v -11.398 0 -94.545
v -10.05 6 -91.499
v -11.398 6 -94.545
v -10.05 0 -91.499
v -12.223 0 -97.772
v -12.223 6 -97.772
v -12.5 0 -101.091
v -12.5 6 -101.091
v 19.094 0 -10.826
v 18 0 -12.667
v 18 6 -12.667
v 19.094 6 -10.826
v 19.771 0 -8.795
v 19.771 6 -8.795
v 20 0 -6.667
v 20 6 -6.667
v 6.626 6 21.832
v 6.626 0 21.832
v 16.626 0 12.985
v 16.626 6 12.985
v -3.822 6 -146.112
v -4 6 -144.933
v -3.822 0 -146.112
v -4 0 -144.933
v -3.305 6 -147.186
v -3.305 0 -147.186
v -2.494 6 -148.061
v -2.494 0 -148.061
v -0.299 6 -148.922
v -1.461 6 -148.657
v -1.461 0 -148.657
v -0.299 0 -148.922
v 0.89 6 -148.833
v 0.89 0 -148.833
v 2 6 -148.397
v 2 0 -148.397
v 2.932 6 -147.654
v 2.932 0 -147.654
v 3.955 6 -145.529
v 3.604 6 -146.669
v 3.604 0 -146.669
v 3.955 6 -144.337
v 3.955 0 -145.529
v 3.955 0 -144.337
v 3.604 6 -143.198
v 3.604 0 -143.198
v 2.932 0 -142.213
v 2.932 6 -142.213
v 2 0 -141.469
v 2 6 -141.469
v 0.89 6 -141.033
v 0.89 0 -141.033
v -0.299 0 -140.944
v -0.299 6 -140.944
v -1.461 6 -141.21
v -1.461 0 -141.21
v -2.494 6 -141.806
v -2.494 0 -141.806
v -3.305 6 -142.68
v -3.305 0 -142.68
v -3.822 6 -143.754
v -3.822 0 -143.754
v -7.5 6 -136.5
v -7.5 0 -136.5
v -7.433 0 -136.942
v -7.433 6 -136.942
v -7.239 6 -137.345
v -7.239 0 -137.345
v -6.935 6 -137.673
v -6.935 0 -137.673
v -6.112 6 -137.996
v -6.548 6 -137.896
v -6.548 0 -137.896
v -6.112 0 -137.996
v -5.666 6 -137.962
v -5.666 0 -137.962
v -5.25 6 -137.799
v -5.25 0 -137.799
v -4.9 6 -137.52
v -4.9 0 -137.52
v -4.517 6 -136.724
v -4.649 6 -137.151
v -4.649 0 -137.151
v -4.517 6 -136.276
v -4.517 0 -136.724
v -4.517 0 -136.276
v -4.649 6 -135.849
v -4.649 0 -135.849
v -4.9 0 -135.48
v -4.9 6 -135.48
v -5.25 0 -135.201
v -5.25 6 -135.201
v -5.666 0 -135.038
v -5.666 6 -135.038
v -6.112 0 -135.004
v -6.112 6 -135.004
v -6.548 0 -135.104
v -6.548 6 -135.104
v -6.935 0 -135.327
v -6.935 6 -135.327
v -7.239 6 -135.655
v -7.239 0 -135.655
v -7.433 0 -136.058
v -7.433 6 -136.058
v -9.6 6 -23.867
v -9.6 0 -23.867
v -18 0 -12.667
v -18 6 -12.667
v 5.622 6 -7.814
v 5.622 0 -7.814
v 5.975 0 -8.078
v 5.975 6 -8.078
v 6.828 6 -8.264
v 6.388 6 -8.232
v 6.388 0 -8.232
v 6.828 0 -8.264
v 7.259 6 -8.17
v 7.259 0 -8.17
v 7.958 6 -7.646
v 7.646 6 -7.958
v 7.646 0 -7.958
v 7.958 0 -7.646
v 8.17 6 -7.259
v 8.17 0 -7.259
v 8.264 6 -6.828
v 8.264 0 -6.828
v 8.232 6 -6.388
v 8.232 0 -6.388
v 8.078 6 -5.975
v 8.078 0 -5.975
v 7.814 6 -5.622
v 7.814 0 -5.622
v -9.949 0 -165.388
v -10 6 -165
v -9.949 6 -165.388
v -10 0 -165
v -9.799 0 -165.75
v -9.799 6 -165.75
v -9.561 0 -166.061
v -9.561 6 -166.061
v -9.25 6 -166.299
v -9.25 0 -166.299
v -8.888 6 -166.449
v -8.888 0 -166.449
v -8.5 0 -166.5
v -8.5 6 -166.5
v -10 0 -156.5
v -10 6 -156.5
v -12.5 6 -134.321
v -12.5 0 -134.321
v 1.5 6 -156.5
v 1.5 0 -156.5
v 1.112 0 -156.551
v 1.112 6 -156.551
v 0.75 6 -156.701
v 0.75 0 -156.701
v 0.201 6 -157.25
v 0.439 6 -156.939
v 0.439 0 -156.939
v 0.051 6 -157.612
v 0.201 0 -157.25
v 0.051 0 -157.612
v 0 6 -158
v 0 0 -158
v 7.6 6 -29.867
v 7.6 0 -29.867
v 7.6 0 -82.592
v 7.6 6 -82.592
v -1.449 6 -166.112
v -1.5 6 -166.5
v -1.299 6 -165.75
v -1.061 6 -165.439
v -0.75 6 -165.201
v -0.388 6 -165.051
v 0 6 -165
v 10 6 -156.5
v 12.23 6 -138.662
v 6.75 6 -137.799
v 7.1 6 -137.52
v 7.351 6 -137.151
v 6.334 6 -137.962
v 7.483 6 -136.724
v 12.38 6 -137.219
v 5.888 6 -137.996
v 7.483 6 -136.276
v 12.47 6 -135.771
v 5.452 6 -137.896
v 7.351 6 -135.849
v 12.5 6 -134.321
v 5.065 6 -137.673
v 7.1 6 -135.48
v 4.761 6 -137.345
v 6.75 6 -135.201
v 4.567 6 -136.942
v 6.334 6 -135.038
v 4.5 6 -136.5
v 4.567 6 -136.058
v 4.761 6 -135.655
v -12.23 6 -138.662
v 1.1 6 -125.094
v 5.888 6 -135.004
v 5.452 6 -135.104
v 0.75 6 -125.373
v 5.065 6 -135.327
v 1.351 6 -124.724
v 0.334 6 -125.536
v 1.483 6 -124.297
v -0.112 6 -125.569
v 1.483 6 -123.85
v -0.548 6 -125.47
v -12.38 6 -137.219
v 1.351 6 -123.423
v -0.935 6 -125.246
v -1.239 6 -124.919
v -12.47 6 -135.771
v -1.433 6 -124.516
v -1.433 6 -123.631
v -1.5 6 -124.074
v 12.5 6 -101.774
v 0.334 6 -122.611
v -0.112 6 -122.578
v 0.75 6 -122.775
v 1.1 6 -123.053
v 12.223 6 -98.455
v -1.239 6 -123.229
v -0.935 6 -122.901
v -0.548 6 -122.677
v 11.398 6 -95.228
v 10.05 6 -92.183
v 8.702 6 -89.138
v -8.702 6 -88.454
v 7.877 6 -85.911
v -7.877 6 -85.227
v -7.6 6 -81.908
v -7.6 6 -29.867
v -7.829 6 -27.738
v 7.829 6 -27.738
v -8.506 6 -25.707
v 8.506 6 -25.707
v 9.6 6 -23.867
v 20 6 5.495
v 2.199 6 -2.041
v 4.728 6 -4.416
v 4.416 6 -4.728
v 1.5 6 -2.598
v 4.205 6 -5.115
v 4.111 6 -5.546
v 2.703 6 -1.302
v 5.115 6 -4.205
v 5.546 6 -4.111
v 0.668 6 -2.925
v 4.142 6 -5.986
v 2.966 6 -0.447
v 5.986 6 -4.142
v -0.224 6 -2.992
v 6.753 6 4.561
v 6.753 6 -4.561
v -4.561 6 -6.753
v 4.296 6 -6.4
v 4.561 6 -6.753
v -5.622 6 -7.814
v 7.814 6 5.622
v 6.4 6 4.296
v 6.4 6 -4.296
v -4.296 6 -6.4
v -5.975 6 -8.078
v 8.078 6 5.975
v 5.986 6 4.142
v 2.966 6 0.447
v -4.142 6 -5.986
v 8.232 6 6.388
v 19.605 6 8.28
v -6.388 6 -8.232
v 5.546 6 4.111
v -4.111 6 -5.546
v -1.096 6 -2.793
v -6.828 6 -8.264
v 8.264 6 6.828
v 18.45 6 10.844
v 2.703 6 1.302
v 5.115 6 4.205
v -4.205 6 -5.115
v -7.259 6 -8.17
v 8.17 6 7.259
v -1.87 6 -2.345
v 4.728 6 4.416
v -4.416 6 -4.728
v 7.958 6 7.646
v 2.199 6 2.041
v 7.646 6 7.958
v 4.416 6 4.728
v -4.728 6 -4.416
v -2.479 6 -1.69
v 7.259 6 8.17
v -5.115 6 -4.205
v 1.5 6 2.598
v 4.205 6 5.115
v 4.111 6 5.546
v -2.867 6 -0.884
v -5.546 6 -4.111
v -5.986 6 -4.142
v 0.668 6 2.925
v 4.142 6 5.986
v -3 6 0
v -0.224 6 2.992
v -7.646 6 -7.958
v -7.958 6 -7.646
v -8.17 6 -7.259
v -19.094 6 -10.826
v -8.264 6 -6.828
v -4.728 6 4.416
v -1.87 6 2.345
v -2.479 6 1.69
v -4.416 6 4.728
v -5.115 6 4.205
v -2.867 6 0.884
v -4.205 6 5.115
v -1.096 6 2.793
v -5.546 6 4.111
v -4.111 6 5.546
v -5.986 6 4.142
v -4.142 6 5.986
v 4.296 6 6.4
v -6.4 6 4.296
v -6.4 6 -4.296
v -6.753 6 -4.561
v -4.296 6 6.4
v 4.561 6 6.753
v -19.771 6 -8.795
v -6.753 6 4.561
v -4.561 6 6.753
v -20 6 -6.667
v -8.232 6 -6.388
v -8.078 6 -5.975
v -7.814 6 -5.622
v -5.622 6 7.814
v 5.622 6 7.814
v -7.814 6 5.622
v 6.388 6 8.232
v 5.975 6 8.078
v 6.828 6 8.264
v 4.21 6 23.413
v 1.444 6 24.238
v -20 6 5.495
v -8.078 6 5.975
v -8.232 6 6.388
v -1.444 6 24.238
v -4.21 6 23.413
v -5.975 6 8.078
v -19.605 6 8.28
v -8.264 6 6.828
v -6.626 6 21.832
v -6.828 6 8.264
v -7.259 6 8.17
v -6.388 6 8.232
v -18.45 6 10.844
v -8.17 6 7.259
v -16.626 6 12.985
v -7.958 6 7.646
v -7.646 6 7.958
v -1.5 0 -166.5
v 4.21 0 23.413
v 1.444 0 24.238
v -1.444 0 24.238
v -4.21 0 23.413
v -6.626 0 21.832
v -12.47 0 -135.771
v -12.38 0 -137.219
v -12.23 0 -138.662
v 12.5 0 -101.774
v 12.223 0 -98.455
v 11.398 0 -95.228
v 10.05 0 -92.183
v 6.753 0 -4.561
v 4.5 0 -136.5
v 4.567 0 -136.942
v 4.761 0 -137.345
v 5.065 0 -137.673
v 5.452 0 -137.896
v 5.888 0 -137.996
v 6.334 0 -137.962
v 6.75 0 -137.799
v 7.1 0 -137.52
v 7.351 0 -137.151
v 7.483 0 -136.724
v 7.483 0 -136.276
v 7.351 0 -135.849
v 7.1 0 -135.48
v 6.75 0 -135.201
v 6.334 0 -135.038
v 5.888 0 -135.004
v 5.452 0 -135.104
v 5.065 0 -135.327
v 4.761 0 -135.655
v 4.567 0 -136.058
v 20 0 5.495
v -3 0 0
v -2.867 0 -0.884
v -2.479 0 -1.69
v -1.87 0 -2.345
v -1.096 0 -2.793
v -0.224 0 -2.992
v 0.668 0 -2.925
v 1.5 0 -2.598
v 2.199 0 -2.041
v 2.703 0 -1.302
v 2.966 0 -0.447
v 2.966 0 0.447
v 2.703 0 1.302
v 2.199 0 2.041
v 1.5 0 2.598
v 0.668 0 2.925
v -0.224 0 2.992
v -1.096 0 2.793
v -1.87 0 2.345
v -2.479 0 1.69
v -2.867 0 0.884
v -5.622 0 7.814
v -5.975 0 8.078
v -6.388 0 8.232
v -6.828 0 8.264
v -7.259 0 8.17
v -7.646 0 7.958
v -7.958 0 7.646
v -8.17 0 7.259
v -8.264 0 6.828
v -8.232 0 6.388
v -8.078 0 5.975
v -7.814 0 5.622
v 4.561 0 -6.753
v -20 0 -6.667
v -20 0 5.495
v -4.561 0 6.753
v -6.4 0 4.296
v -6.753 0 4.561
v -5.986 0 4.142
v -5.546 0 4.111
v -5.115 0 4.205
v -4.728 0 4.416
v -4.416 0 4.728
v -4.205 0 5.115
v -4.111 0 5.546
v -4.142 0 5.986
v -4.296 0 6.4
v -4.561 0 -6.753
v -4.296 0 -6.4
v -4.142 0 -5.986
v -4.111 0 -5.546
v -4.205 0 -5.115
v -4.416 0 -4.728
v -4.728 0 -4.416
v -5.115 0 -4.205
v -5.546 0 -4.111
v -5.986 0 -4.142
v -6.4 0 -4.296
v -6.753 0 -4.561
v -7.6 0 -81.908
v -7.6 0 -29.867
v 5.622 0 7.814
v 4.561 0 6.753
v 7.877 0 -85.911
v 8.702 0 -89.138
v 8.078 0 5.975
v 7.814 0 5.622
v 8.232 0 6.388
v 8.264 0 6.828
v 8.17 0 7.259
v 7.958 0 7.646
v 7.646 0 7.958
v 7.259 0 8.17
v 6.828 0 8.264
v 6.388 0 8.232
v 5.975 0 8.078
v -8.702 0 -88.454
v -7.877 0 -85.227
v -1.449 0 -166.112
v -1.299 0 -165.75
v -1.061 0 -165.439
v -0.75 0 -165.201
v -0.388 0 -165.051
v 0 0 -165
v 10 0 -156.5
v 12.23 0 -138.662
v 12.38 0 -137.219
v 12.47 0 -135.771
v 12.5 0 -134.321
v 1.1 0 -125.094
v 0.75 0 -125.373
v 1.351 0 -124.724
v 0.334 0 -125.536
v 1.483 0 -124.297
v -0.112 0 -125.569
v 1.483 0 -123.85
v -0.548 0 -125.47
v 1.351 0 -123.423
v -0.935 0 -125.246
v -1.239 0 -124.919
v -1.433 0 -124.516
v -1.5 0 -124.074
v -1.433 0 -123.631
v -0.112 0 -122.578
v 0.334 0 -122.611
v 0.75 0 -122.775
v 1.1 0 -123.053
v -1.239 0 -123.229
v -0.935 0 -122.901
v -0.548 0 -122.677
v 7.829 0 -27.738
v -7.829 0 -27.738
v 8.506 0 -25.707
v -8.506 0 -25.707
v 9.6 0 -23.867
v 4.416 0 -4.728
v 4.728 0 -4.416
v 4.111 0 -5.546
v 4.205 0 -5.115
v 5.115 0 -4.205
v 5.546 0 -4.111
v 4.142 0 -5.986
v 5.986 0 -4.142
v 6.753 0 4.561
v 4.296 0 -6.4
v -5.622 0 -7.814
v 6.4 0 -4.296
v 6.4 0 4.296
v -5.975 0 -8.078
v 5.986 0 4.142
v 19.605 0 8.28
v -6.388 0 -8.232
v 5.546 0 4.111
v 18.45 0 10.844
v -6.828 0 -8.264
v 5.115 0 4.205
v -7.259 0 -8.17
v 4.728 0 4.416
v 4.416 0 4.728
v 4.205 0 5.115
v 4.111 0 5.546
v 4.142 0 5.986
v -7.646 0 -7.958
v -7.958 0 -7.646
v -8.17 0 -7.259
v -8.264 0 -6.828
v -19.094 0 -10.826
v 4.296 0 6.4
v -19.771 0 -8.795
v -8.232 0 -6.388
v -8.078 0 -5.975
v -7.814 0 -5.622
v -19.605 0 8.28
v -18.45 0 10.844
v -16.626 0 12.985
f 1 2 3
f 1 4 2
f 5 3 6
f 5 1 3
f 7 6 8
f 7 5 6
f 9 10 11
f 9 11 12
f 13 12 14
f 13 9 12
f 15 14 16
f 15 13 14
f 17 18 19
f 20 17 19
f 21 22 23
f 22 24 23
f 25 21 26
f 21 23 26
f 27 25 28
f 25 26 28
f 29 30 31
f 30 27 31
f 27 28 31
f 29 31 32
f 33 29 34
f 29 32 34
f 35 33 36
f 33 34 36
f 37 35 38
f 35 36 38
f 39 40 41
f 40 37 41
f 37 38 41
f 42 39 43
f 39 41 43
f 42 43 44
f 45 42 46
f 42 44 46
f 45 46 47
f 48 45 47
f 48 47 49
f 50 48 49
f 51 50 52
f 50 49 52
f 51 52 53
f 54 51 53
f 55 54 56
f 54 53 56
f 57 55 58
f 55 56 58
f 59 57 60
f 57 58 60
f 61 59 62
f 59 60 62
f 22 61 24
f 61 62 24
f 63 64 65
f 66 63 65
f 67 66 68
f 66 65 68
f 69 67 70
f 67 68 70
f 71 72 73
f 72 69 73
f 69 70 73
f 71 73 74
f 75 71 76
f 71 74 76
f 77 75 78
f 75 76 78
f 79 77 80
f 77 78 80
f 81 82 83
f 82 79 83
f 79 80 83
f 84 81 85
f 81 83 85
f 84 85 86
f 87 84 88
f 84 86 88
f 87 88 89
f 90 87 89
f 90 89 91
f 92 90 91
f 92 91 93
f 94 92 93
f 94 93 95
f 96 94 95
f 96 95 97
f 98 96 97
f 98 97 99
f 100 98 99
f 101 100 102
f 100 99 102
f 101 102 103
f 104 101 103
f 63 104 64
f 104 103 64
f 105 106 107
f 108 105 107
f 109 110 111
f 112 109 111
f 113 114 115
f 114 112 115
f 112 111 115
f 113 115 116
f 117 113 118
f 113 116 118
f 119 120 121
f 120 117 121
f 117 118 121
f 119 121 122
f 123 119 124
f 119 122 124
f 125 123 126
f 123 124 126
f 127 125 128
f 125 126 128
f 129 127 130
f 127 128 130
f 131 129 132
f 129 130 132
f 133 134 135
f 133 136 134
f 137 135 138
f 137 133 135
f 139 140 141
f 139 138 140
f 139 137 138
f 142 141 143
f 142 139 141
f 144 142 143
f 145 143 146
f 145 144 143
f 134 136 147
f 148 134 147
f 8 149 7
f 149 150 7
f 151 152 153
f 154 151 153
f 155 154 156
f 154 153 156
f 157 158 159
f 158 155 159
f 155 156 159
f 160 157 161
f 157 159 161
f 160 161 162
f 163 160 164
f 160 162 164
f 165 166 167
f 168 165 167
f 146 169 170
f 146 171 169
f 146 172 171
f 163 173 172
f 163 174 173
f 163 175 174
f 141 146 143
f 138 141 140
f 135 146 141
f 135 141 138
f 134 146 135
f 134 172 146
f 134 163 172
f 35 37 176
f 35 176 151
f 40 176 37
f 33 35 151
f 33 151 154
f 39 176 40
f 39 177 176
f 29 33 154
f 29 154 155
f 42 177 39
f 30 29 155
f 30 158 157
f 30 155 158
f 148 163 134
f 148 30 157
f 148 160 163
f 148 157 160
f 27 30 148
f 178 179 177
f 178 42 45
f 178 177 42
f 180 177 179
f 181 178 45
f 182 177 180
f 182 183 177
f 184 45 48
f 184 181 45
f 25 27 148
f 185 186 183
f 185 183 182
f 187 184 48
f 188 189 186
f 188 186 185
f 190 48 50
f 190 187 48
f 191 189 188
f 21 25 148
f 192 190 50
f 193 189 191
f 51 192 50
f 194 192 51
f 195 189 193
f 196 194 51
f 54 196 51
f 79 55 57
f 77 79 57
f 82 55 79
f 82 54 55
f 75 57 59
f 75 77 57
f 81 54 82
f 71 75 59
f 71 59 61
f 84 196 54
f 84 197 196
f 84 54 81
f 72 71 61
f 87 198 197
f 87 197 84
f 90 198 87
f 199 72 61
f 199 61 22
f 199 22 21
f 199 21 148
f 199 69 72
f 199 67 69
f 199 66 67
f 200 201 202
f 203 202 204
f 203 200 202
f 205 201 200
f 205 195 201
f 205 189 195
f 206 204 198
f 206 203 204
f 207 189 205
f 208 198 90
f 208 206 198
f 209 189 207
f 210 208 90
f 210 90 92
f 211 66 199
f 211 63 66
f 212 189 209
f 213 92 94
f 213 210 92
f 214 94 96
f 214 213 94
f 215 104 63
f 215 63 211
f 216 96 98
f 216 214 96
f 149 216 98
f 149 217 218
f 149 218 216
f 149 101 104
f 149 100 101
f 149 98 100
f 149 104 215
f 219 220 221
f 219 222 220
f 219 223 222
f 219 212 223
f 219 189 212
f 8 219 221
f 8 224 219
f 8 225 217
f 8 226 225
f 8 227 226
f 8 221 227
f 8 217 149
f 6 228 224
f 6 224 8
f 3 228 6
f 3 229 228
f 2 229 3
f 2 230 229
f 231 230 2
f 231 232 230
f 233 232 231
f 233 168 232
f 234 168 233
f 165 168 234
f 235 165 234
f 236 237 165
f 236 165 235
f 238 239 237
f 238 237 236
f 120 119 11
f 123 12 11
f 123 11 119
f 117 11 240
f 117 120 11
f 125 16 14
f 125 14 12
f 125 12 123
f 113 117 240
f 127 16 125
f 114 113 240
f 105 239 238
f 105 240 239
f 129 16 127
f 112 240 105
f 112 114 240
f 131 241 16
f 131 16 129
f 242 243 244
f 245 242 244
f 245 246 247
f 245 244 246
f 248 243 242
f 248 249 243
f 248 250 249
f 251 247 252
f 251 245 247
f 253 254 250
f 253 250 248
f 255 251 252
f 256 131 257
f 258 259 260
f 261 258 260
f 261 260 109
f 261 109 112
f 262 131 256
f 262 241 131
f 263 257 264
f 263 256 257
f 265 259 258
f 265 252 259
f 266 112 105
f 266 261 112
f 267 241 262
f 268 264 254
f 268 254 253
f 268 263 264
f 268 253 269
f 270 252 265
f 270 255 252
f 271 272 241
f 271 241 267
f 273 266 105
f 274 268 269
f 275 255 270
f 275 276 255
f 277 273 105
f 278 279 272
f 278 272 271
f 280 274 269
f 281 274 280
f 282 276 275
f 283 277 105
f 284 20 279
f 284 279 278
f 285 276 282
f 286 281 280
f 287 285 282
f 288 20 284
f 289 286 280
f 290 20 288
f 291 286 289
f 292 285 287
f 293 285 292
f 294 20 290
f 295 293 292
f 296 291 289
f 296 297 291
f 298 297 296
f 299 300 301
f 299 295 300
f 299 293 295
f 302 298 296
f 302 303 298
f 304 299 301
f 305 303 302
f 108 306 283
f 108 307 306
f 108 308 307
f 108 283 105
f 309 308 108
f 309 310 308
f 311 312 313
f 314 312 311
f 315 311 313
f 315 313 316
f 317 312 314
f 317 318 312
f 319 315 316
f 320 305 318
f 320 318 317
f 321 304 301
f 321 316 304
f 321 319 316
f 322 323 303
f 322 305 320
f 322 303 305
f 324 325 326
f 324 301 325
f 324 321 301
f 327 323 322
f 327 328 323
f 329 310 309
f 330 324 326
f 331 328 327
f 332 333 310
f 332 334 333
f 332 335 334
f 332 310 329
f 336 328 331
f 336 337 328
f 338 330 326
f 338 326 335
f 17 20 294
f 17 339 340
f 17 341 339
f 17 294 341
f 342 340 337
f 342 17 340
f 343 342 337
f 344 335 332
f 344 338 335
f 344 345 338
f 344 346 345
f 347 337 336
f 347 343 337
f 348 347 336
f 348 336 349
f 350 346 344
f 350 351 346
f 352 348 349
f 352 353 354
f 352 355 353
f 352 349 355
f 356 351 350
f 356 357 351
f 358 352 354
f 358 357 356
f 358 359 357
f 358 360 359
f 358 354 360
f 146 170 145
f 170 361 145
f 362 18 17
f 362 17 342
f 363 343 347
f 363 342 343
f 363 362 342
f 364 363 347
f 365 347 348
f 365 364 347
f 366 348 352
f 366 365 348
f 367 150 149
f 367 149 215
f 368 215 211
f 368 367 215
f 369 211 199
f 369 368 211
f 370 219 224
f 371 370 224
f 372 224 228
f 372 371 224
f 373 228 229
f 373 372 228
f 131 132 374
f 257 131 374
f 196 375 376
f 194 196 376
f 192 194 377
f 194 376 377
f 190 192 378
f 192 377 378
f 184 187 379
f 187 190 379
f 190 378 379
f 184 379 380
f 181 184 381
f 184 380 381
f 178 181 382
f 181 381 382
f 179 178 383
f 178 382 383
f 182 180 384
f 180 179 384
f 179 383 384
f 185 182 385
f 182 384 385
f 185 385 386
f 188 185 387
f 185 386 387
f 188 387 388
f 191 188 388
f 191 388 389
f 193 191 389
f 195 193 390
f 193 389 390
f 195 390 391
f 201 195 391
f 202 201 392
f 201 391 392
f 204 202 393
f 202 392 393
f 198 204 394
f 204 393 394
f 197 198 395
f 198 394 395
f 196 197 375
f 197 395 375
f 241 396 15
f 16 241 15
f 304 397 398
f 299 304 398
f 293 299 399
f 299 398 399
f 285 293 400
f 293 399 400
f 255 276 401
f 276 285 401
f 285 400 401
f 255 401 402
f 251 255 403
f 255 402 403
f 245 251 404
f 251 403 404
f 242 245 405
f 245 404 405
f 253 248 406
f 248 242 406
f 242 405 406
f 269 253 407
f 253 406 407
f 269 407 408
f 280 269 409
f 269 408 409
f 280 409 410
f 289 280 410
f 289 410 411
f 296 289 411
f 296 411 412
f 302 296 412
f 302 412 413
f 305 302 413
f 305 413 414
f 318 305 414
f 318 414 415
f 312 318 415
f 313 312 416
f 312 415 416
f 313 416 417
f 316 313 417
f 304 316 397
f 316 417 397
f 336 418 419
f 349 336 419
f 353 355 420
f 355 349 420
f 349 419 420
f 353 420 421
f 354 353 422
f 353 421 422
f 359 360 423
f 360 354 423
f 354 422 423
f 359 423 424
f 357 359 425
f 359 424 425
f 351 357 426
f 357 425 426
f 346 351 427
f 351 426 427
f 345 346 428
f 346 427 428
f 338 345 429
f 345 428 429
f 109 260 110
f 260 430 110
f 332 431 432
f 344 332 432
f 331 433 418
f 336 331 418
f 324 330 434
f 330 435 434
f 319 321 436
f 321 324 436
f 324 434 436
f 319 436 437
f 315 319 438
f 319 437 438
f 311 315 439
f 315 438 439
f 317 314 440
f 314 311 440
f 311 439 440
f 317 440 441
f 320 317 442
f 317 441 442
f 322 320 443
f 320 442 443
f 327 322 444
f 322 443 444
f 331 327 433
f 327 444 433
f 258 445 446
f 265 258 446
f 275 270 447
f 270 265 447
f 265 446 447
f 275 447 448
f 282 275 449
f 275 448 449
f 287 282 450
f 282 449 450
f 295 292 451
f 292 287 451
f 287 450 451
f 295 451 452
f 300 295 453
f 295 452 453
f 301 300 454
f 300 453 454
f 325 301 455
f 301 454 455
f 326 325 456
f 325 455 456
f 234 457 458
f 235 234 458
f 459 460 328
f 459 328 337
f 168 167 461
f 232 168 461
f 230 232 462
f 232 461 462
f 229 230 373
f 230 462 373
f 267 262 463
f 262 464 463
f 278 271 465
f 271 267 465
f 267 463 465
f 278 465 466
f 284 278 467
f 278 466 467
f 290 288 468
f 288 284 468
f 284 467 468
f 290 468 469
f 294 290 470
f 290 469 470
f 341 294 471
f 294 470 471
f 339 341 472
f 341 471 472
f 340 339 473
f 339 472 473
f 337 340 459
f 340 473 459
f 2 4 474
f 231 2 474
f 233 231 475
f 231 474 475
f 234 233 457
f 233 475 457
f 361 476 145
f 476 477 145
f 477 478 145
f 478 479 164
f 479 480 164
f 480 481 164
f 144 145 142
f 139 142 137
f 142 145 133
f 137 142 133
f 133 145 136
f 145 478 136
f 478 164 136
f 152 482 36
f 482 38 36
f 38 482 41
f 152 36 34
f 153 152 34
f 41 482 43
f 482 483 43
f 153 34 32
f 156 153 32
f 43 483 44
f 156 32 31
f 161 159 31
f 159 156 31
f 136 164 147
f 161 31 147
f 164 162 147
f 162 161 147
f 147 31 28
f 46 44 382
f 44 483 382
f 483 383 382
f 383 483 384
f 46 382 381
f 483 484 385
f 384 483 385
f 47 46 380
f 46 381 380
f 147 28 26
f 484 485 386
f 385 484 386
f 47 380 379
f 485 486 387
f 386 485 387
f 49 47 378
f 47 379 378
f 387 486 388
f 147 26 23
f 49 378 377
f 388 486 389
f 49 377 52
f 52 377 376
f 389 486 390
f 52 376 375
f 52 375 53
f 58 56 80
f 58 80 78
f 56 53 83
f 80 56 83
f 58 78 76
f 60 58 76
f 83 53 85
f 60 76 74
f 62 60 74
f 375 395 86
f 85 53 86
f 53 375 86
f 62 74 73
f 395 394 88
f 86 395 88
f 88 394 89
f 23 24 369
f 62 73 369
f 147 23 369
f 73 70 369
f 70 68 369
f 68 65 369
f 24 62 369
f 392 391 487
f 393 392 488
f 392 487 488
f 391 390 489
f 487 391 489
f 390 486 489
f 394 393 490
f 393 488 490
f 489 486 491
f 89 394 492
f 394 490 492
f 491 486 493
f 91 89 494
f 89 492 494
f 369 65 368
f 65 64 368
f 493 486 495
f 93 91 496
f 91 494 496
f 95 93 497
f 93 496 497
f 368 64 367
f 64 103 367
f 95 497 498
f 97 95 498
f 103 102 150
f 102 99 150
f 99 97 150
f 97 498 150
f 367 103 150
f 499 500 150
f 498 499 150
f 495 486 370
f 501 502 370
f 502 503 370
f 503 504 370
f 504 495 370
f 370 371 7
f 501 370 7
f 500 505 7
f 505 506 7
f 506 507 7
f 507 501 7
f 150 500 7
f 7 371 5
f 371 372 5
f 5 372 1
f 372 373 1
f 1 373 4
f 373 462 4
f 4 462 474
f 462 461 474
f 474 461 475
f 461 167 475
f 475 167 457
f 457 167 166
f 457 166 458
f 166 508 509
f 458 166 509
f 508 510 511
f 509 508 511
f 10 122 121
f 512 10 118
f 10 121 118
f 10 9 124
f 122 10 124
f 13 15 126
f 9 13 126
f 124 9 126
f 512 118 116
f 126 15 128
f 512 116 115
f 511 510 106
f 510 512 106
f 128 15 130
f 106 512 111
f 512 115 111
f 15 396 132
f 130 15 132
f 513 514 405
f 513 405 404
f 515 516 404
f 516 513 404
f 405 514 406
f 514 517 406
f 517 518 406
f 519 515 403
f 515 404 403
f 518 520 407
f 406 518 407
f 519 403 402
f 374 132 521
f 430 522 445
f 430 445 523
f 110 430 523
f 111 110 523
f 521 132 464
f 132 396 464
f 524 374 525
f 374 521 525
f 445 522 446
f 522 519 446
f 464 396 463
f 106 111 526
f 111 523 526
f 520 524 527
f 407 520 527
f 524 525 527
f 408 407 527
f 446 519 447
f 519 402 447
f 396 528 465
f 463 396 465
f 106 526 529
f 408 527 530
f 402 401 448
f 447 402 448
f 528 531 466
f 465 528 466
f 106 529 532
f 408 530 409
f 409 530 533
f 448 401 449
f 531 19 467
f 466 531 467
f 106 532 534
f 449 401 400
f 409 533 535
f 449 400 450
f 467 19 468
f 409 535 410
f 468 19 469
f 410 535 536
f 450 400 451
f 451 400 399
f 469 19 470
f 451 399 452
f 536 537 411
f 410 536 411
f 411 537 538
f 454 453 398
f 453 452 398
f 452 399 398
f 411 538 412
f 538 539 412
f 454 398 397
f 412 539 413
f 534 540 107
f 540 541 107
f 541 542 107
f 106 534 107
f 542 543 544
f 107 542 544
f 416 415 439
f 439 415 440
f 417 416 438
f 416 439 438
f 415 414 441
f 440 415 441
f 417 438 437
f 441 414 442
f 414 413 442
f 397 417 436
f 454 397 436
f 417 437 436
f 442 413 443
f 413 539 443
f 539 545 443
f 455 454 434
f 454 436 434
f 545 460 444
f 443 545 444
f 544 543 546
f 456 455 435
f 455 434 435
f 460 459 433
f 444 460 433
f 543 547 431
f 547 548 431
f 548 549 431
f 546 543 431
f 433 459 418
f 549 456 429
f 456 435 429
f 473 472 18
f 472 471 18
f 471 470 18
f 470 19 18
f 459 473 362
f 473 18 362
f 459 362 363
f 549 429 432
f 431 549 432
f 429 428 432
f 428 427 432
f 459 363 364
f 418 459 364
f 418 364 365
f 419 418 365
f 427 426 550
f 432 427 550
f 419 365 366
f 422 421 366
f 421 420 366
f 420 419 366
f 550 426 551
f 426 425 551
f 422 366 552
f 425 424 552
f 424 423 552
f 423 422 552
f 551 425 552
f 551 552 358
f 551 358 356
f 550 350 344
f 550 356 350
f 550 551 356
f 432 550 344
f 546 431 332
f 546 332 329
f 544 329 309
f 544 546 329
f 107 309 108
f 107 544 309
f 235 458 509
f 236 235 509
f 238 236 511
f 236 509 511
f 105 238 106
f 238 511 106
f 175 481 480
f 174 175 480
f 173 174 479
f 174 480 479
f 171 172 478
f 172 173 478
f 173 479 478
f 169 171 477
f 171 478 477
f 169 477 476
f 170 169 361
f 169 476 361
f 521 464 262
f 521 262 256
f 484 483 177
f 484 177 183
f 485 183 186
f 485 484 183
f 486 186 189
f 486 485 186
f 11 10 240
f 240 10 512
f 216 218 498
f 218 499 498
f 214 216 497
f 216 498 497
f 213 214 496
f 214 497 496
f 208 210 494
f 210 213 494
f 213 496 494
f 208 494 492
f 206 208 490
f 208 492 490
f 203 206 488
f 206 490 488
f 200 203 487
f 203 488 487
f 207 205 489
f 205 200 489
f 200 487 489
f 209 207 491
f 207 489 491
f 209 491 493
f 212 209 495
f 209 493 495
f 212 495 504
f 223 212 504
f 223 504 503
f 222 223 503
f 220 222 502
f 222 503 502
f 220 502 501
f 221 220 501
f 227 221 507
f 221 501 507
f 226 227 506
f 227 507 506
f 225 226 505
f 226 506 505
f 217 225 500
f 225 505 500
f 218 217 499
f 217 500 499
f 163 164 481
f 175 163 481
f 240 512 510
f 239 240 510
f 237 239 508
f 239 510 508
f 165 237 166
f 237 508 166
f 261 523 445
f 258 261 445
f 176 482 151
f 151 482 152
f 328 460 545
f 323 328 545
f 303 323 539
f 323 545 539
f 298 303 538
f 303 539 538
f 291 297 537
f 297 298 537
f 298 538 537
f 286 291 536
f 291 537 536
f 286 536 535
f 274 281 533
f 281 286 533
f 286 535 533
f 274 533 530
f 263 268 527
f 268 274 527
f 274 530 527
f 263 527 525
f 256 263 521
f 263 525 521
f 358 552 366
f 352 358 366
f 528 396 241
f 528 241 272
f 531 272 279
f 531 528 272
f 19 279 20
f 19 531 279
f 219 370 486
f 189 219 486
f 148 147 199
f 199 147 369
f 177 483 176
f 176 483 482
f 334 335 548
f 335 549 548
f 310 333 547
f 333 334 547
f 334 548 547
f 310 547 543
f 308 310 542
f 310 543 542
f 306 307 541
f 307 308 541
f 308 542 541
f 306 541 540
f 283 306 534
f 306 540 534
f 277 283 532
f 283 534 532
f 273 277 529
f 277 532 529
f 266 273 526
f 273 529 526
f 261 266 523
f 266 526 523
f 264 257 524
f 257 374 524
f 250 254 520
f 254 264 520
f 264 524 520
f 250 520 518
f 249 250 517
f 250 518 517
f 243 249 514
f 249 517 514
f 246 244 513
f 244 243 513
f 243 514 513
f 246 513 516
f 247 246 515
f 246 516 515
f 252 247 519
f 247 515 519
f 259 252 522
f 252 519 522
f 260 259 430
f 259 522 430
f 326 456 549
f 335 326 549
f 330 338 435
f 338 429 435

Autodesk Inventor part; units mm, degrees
ref_plane "YZ Plane" through (0, 0, 0) normal (1, 0, 0) x (0, 1, 0)
ref_plane "XZ Plane" through (0, 0, 0) normal (0, 1, 0) x (-1, 0, 0)
ref_plane "XY Plane" through (0, 0, 0) normal (0, 0, 1) x (1, 0, 0)
sketch "Sketch1" plane through (0, 0, 0) normal (0, 1, 0) x (-1, 0, 0)
  line L0 (0, -158) -> (0, -165)
  arc A0 (1.5, -166.5) -> (0, -165) centre (0, -166.5) ccw
  line L1 (1.5, -166.5) -> (8.5, -166.5)
  arc A1 (8.5, -166.5) -> (10, -165) centre (8.5, -165) ccw
  line L2 (10, -165) -> (10, -156.5)
  line L3 (10, -156.5) -> (12.2297, -138.6622)
  arc A2 (12.2297, -138.6622) -> (12.5, -134.321) centre (-22.5, -134.321) ccw
  line L4 (12.5, -134.321) -> (12.5, -101.0909)
  arc A3 (12.5, -101.0909) -> (10.05, -91.4994) centre (-7.5, -101.0909) ccw
  arc A4 (7.6, -81.9079) -> (10.05, -91.4994) centre (27.6, -81.9079) ccw
  line L5 (7.6, -81.9079) -> (7.6, -29.8667)
  arc A5 (9.6, -23.8667) -> (7.6, -29.8667) centre (17.6, -29.8667) ccw
  line L6 (9.6, -23.8667) -> (18, -12.6667)
  arc A6 (18, -12.6667) -> (20, -6.6667) centre (10, -6.6667) ccw
  line L7 (20, -6.6667) -> (20, 5.4953)
  arc A7 (20, 5.4953) -> (16.6262, 12.9849) centre (10, 5.4953) ccw
  line L8 (16.6262, 12.9849) -> (6.6262, 21.8321)
  arc A8 (6.6262, 21.8321) -> (-6.6262, 21.8321) centre (0, 14.3426) ccw
  line L9 (-6.6262, 21.8321) -> (-16.6262, 12.9849)
  arc A9 (-16.6262, 12.9849) -> (-20, 5.4953) centre (-10, 5.4953) ccw
  line L10 (-20, 5.4953) -> (-20, -6.6667)
  arc A10 (-20, -6.6667) -> (-18, -12.6667) centre (-10, -6.6667) ccw
  line L11 (-18, -12.6667) -> (-9.6, -23.8667)
  arc A11 (-7.6, -29.8667) -> (-9.6, -23.8667) centre (-17.6, -29.8667) ccw
  line L12 (-7.6, -29.8667) -> (-7.6, -82.5915)
  arc A12 (-10.05, -92.183) -> (-7.6, -82.5915) centre (-27.6, -82.5915) ccw
  arc A13 (-10.05, -92.183) -> (-12.5, -101.7745) centre (7.5, -101.7745) ccw
  line L13 (-12.5, -101.7745) -> (-12.5, -134.321)
  arc A14 (-12.5, -134.321) -> (-12.2297, -138.6622) centre (22.5, -134.321) ccw
  line L14 (-12.2297, -138.6622) -> (-10, -156.5)
  line L15 (-10, -156.5) -> (-1.5, -156.5)
  arc A15 (0, -158) -> (-1.5, -156.5) centre (-1.5, -158) ccw
  arc A16 (-6.7529, 4.5608) -> (-4.5608, 6.7529) centre (-5.6569, 5.6569) ccw
  line L16 (-4.5608, 6.7529) -> (-5.6215, 7.8135)
  arc A17 (-5.6215, 7.8135) -> (-7.8135, 5.6215) centre (-6.7175, 6.7175) ccw
  line L17 (-7.8135, 5.6215) -> (-6.7529, 4.5608)
  line L18 (6.7529, -4.5608) -> (7.8135, -5.6215)
  arc A18 (5.6215, -7.8135) -> (7.8135, -5.6215) centre (6.7175, -6.7175) ccw
  line L19 (5.6215, -7.8135) -> (4.5608, -6.7529)
  arc A19 (6.7529, -4.5608) -> (4.5608, -6.7529) centre (5.6569, -5.6569) ccw
  line L20 (-7.8135, -5.6215) -> (-6.7529, -4.5608)
  arc A20 (-4.5608, -6.7529) -> (-6.7529, -4.5608) centre (-5.6569, -5.6569) ccw
  line L21 (-4.5608, -6.7529) -> (-5.6215, -7.8135)
  arc A21 (-7.8135, -5.6215) -> (-5.6215, -7.8135) centre (-6.7175, -6.7175) ccw
  line L22 (7.8135, 5.6215) -> (6.7529, 4.5608)
  arc A22 (4.5608, 6.7529) -> (6.7529, 4.5608) centre (5.6569, 5.6569) ccw
  line L23 (4.5608, 6.7529) -> (5.6215, 7.8135)
  arc A23 (7.8135, 5.6215) -> (5.6215, 7.8135) centre (6.7175, 6.7175) ccw
  circle A24 centre (0, 0) radius 3
  circle A25 centre (0, -124.0736) radius 1.5
  circle A26 centre (-6, -136.5) radius 1.5
  circle A27 centre (6, -136.5) radius 1.5
  circle A28 centre (0, -144.9332) radius 4
  point P0 (10, -165)
  point P1 (12.2297, -138.6622)
  point P2 (12.5, -101.0909)
  point P3 (10.05, -91.4994)
  point P4 (7.6, -81.9079)
  point P5 (7.6, -29.8667)
  point P6 (9.6, -23.8667)
  point P7 (20, -6.6667)
  point P8 (20, 5.4953)
  point P9 (16.6262, 12.9849)
  point P10 (6.6262, 21.8321)
  point P11 (-16.6262, 12.9849)
  point P12 (-20, 5.4953)
  point P13 (-9.6, -23.8667)
  point P14 (-10.05, -92.183)
  point P15 (-12.2297, -138.6622)
  point P16 (0, -158)
  point P17 (6.7529, -4.5608)
  point P18 (7.8135, -5.6215)
  point P19 (5.6215, -7.8135)
  point P20 (-7.8135, -5.6215)
  point P21 (-6.7529, -4.5608)
  point P22 (-4.5608, -6.7529)
  point P23 (-5.6215, -7.8135)
  point P24 (-5.6215, 7.8135)
  point P25 (-4.5608, 6.7529)
extrude "Extrusion1" add sketch "Sketch1" along normal blind 6
properties part number "TokerCNC froggy arm"
